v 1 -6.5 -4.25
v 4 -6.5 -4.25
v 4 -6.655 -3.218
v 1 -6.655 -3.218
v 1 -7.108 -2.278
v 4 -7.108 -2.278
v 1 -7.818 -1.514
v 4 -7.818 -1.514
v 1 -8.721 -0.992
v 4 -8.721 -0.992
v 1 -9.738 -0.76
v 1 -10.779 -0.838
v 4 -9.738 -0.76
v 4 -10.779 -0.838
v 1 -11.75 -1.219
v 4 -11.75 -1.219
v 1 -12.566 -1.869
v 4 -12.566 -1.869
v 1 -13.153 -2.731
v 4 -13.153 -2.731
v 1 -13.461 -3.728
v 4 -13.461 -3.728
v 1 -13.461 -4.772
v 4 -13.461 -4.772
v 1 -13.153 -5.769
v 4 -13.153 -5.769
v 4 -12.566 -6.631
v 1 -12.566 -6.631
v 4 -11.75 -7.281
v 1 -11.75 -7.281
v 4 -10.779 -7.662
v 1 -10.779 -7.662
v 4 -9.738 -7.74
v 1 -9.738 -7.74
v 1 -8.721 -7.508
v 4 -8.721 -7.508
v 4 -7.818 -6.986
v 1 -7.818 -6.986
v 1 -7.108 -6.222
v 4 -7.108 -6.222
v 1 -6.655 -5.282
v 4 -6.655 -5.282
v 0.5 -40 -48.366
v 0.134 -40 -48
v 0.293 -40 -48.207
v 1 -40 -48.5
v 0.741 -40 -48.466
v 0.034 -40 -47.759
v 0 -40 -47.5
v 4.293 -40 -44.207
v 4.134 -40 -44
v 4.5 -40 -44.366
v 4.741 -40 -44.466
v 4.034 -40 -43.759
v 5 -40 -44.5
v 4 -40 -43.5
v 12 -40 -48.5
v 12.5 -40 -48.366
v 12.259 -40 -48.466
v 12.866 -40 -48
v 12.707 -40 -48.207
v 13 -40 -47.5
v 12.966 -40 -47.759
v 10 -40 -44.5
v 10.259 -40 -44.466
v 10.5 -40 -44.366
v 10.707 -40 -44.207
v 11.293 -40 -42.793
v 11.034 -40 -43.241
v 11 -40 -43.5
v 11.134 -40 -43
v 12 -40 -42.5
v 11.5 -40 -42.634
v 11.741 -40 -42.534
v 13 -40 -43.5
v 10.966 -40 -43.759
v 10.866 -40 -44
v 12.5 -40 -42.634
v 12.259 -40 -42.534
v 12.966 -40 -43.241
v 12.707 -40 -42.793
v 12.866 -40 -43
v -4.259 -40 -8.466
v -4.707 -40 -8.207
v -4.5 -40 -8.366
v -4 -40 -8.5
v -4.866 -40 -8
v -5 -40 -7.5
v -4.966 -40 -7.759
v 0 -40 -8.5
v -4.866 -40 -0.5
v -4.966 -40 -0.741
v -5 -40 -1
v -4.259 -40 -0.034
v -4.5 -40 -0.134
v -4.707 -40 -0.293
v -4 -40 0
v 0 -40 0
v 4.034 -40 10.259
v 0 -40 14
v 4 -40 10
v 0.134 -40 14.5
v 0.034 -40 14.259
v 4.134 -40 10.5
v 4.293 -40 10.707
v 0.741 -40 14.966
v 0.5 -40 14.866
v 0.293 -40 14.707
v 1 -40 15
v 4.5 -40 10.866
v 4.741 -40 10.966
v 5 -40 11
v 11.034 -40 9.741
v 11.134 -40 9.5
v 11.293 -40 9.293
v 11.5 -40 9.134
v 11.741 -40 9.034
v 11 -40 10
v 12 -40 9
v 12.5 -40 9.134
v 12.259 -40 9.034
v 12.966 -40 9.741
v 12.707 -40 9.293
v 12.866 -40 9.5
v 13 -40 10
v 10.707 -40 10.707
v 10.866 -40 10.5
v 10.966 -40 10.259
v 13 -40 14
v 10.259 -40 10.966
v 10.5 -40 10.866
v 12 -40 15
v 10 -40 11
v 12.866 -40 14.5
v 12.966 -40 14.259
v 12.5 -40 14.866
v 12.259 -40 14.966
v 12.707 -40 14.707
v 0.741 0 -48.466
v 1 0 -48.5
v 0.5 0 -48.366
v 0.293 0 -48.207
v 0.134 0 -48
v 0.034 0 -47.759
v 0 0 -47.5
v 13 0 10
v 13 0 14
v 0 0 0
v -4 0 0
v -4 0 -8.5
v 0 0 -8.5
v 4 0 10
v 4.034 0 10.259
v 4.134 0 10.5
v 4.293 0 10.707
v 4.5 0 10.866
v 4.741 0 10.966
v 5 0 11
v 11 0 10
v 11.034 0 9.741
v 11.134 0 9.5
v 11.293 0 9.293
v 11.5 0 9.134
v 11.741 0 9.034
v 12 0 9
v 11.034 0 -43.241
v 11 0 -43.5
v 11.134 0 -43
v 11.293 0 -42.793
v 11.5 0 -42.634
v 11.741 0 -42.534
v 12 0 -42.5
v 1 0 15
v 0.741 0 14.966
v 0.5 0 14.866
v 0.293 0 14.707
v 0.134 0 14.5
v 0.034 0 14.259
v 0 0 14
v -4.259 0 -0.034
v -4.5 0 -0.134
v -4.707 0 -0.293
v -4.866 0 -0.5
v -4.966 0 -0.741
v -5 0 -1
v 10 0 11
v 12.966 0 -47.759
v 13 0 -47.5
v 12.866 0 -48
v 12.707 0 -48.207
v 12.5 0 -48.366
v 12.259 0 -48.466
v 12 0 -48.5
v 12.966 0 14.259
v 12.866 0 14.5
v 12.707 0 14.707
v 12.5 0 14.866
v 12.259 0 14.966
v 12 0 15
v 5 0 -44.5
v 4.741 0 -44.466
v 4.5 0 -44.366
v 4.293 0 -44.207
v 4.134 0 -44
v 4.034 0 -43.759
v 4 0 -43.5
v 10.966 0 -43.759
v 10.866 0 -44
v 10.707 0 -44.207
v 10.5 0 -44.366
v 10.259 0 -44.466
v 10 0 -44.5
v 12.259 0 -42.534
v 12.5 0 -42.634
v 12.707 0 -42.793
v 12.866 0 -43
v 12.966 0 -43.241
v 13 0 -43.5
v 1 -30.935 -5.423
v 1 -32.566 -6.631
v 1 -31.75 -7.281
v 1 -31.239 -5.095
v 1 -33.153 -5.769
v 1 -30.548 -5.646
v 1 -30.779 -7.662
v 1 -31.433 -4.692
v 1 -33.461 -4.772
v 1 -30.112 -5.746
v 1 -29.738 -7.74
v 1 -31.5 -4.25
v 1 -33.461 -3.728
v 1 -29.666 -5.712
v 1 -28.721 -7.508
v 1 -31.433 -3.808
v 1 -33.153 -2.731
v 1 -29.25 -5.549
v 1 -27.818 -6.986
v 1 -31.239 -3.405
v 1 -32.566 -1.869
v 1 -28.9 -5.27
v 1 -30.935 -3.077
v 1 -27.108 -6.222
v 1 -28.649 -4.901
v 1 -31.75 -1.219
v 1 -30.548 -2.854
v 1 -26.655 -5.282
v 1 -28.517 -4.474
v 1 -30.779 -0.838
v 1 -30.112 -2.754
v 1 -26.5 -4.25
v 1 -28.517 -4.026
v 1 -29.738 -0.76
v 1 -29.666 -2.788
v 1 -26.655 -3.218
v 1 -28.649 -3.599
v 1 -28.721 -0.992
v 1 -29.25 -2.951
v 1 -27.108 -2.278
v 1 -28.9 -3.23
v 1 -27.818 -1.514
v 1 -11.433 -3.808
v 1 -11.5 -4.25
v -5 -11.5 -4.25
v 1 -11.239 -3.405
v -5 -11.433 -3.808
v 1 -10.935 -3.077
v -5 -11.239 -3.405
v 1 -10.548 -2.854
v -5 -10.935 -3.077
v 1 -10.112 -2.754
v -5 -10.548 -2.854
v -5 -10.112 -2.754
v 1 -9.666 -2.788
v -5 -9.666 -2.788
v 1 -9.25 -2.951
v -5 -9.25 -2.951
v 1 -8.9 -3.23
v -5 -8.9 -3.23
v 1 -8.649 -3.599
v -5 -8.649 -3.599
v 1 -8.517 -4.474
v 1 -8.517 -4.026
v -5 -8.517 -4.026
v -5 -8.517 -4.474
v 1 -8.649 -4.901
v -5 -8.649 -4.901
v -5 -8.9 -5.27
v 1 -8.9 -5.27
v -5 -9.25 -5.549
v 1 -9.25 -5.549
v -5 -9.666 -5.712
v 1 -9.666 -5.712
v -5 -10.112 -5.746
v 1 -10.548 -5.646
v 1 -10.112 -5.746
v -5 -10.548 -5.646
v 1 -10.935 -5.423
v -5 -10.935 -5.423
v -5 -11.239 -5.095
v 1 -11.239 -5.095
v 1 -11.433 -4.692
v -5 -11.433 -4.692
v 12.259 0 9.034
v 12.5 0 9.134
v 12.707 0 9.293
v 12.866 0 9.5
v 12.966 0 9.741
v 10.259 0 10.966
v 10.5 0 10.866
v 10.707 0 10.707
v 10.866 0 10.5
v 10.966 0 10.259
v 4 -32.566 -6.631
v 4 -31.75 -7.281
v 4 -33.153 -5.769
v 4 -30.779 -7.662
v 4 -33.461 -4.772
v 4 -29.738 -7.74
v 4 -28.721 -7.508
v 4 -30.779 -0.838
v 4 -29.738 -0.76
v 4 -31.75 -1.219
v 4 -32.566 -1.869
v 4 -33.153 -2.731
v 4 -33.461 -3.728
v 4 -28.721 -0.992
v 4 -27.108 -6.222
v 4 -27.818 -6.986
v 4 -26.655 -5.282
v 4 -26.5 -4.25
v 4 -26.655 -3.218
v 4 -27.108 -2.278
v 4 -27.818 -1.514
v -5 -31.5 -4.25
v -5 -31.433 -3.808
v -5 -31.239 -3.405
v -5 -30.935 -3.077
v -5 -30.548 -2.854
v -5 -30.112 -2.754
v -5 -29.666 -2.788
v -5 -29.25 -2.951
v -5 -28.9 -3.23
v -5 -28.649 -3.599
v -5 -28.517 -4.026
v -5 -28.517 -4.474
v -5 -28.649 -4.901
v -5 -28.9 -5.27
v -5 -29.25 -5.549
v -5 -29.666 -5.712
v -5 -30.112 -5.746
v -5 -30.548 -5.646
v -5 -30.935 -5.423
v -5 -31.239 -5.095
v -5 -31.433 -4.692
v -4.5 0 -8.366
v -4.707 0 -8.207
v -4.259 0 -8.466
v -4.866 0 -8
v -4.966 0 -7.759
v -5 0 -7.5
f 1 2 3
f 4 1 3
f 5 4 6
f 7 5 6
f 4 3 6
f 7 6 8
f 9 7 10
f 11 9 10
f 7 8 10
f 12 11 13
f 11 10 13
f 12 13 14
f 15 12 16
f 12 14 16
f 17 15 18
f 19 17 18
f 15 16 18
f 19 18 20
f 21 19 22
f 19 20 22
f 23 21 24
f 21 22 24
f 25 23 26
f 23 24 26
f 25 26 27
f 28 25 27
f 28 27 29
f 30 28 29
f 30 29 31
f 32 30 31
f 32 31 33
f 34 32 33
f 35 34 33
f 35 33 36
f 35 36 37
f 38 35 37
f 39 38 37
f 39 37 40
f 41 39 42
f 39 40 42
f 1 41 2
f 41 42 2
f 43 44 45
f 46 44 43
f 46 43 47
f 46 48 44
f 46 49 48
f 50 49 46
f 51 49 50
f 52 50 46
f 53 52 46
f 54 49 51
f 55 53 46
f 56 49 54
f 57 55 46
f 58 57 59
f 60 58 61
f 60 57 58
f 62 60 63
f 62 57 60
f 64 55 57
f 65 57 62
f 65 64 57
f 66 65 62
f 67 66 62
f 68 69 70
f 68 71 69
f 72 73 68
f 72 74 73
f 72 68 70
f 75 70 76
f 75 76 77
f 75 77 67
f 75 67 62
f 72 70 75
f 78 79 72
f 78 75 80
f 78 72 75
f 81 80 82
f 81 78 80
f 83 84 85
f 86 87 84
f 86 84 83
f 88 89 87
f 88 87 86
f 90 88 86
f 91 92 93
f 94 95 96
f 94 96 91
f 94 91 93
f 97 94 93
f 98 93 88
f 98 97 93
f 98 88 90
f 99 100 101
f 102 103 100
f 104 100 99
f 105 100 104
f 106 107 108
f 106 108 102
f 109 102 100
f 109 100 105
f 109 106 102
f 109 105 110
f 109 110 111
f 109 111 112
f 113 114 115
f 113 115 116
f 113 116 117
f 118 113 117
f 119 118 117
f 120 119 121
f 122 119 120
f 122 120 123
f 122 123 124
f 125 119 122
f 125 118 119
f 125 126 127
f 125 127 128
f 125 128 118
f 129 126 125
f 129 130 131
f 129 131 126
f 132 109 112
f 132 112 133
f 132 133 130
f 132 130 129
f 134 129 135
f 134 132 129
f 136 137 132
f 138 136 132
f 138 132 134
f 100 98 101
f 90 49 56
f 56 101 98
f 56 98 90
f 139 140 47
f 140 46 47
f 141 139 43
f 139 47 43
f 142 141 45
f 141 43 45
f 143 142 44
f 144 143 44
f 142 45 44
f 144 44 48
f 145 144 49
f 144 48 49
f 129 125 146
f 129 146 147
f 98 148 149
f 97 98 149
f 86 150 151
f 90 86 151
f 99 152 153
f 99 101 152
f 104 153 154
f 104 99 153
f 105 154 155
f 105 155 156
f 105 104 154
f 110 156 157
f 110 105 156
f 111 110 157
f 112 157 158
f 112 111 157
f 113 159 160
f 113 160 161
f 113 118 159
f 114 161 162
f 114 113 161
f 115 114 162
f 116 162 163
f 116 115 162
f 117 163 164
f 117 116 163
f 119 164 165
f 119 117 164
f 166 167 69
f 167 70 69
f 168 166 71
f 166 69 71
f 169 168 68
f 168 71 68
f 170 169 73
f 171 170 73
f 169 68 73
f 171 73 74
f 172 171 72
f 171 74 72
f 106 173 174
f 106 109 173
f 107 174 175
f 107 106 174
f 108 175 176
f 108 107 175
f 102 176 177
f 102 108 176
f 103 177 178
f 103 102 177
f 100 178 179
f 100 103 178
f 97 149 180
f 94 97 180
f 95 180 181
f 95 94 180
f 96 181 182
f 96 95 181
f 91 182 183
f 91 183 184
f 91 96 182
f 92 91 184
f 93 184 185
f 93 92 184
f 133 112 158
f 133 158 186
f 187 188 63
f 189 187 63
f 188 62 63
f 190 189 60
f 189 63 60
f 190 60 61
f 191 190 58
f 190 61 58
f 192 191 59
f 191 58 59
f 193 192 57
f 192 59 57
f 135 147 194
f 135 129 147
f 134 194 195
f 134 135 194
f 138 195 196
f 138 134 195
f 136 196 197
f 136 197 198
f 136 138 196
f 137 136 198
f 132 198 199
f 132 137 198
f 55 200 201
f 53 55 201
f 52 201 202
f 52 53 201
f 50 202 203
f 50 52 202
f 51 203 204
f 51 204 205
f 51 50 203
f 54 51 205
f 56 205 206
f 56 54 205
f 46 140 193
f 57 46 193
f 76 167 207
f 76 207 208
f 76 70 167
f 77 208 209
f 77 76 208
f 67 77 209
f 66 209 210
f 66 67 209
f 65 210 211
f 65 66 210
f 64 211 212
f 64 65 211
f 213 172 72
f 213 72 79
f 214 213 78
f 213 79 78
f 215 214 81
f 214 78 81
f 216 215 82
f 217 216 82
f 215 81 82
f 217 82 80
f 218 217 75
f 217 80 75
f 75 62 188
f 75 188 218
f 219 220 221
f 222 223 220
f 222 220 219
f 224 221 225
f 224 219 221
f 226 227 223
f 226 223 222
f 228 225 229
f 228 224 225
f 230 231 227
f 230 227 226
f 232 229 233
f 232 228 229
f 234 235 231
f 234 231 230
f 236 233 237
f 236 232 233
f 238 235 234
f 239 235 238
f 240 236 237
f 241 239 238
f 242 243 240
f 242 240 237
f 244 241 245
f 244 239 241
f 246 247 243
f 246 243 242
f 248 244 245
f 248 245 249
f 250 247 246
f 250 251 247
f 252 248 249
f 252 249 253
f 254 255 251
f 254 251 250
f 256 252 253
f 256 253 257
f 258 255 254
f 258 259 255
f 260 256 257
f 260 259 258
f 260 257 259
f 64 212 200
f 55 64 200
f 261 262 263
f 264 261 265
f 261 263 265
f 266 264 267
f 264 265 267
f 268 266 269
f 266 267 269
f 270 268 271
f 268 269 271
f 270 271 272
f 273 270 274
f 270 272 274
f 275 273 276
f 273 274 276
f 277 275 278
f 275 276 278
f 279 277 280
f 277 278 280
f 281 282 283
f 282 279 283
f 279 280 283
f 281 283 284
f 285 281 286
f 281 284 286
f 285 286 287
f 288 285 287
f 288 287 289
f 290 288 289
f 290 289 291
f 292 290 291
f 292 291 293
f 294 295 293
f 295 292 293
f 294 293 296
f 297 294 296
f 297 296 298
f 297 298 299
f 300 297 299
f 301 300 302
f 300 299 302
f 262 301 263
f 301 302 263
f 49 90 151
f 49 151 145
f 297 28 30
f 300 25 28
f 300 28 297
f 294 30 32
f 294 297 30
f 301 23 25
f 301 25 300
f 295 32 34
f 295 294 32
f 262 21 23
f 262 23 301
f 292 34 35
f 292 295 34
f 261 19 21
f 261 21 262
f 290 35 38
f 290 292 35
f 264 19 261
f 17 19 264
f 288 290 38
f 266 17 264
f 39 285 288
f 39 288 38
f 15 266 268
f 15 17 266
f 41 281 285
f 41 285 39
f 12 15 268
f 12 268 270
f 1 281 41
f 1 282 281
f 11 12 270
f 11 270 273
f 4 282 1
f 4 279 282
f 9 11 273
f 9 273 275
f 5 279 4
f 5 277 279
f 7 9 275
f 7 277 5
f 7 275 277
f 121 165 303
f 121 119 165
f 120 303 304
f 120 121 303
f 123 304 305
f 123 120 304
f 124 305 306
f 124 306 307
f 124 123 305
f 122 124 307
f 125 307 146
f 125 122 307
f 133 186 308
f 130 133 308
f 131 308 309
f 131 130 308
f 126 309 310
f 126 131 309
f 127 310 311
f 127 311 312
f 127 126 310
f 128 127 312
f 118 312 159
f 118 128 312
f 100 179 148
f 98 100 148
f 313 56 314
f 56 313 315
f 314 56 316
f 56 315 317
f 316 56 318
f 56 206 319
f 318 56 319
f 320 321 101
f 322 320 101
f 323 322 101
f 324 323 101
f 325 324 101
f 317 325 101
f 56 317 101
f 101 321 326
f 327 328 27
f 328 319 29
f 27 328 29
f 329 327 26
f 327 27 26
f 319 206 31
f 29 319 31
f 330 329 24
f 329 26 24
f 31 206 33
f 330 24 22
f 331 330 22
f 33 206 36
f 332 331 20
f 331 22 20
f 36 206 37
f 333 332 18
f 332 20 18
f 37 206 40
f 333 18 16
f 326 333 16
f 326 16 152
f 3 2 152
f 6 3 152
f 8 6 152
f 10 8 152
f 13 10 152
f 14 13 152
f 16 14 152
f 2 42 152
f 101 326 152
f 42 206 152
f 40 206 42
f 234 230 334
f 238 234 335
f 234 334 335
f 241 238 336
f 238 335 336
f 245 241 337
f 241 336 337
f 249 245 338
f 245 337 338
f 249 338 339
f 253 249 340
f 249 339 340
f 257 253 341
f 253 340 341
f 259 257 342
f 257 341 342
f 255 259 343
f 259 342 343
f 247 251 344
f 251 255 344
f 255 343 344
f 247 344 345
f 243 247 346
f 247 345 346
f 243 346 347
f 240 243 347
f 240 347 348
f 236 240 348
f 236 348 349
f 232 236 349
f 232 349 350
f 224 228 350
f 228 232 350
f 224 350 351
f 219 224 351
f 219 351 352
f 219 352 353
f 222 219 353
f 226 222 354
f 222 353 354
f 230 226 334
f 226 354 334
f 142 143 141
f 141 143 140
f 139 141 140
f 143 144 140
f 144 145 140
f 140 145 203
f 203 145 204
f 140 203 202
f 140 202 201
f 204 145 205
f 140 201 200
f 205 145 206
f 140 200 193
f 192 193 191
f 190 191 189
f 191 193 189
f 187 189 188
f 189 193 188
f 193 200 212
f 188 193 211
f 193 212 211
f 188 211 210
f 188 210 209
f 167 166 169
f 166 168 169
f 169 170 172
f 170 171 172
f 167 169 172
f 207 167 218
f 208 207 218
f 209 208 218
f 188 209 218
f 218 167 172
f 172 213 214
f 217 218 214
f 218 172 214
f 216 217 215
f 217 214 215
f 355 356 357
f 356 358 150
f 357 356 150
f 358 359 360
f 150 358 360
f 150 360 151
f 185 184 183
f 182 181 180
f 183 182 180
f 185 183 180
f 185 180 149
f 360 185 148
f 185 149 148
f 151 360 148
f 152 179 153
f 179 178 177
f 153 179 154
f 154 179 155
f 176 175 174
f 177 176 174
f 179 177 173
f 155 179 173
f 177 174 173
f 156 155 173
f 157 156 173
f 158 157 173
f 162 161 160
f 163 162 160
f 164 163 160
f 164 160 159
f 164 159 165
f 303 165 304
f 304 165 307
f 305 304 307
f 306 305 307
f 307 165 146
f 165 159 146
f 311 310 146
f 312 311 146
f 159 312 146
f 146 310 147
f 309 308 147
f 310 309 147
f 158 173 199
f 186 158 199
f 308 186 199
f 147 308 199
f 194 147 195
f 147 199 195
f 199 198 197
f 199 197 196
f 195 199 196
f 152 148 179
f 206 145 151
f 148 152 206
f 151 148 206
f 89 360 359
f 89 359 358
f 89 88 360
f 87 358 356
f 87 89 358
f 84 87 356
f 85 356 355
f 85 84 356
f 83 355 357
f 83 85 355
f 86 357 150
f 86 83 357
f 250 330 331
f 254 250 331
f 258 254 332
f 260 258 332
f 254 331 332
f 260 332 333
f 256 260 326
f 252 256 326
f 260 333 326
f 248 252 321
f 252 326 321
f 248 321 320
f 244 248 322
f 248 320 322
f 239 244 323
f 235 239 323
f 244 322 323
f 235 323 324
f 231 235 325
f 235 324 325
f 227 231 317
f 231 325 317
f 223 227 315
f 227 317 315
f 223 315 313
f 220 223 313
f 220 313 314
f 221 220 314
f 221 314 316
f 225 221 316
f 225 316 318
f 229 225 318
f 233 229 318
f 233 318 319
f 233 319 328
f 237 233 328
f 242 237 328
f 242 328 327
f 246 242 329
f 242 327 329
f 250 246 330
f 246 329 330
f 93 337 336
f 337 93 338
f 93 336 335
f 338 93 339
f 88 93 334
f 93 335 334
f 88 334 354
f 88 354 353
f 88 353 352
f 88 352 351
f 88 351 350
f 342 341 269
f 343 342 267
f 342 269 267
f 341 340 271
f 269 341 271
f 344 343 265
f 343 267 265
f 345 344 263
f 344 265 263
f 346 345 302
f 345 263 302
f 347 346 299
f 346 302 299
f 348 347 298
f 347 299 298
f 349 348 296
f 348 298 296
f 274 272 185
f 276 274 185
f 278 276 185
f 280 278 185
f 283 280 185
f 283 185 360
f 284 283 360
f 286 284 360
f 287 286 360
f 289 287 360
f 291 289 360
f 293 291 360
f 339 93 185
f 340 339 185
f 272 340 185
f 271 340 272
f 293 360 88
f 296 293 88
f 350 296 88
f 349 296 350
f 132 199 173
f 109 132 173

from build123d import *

# Parameters (mm, degrees)
F1_DEPTH = 40
F2_R     = 1.5
F3_DEPTH = 25
F5_R     = 1
F4_R     = 3.5
F4_R_2   = 1.5
F6_DEPTH = 3
F7_R     = 0.99999


# Not quite as in the source:
# - a fillet or chamfer is up to 0.001 mm smaller than in the source, because OpenCascade refuses the exact size


with BuildPart() as f1:
    # F0 (on Front) → F1 (new body)
    with BuildSketch(Plane.XZ):
        Polygon((13, 15), (0, 15), (0, 0), (-5, 0), (-5, -8.5), (0, -8.5), (0, -48.5), (13, -48.5), (13, -42.5), (11, -42.5), (11, -44.5), (4, -44.5), (4, 11), (11, 11), (11, 9), (13, 9), align=None)
    extrude(amount=F1_DEPTH)

    # F2 (on face) → F3 (cut)
    with BuildSketch(Plane(origin=(-5, 0, 0), x_dir=(0, -1, 0), z_dir=(-1, 0, 0))):
        with Locations((10, -4.25)):
            Circle(F2_R)
        with Locations((30, -4.25)):
            Circle(F2_R)
    extrude(amount=-F3_DEPTH, mode=Mode.SUBTRACT)

    # F5
    f5_edges = [f1.edges().sort_by_distance(p)[0] for p in [
        (-5, -20, 0),
        (-5, -20, -8.5),
    ]]
    fillet(f5_edges, radius=F5_R)

    # F4 (on face) → F6 (cut)
    with BuildSketch(Plane.YZ.offset(4)):
        with Locations((-10, -4.25)):
            Circle(F4_R)
        with Locations((-10, -4.25)):
            Circle(F4_R_2, mode=Mode.SUBTRACT)
        with Locations((-30, -4.25)):
            Circle(F4_R)
        with Locations((-30, -4.25)):
            Circle(F4_R_2, mode=Mode.SUBTRACT)
    extrude(amount=-F6_DEPTH, mode=Mode.SUBTRACT)

    # F7 (radius 1 in the source; OpenCascade refuses exactly that, so slightly less here)
    f7_edges = [f1.edges().sort_by_distance(p)[0] for p in [
        (13, -20, 9),
        (11, -20, 9),
        (13, -20, 15),
        (0, -20, 15),
        (4, -20, 11),
        (0, -20, -48.5),
        (13, -20, -48.5),
        (13, -20, -42.5),
        (4, -20, -44.5),
        (11, -20, -42.5),
        (11, -20, -44.5),
        (11, -20, 11),
    ]]
    fillet(f7_edges, radius=F7_R)


solid = f1.part
